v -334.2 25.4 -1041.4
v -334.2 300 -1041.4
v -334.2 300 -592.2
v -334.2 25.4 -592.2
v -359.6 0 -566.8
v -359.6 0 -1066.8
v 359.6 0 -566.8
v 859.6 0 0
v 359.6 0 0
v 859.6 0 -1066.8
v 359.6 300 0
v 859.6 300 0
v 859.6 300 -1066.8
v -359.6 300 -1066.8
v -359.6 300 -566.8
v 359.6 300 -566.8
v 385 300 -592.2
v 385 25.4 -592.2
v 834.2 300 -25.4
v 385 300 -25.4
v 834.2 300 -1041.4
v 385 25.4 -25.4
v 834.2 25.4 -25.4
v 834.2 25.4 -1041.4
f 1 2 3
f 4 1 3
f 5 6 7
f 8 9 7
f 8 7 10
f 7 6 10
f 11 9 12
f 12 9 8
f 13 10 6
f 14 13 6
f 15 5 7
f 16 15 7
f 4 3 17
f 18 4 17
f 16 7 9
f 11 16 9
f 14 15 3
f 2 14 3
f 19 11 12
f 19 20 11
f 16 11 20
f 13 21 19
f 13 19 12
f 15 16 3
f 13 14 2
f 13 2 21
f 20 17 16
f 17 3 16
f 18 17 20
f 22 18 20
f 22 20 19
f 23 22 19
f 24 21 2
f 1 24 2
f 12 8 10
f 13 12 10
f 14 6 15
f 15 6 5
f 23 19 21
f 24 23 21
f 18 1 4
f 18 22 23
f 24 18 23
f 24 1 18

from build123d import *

# Parameters (mm, degrees)
BOSS_EXTRUDE1_DEPTH = 300
CUT_EXTRUDE1_DEPTH  = 274.6


with BuildPart() as part:
    # Sketch1 → Boss-Extrude1 (new body)
    with BuildSketch(Plane(origin=(0, 0, 0), x_dir=(1, 0, 0), z_dir=(0, 1, 0))):
        Polygon((359.6, 1066.8), (-359.6, 1066.8), (-359.6, 566.8), (359.6, 566.8), (359.6, 0), (859.6, 0), (859.6, 1066.8), align=None)
    extrude(amount=BOSS_EXTRUDE1_DEPTH)

    # Sketch2 → Cut-Extrude1 (cut)
    with BuildSketch(Plane(origin=(0, 300, 0), x_dir=(1, 0, 0), z_dir=(0, 1, 0))):
        Polygon((834.2, 25.4), (834.2, 1041.4), (-334.2, 1041.4), (-334.2, 592.2), (385, 592.2), (385, 25.4), align=None)
    extrude(amount=-CUT_EXTRUDE1_DEPTH, mode=Mode.SUBTRACT)


solid = part.part
